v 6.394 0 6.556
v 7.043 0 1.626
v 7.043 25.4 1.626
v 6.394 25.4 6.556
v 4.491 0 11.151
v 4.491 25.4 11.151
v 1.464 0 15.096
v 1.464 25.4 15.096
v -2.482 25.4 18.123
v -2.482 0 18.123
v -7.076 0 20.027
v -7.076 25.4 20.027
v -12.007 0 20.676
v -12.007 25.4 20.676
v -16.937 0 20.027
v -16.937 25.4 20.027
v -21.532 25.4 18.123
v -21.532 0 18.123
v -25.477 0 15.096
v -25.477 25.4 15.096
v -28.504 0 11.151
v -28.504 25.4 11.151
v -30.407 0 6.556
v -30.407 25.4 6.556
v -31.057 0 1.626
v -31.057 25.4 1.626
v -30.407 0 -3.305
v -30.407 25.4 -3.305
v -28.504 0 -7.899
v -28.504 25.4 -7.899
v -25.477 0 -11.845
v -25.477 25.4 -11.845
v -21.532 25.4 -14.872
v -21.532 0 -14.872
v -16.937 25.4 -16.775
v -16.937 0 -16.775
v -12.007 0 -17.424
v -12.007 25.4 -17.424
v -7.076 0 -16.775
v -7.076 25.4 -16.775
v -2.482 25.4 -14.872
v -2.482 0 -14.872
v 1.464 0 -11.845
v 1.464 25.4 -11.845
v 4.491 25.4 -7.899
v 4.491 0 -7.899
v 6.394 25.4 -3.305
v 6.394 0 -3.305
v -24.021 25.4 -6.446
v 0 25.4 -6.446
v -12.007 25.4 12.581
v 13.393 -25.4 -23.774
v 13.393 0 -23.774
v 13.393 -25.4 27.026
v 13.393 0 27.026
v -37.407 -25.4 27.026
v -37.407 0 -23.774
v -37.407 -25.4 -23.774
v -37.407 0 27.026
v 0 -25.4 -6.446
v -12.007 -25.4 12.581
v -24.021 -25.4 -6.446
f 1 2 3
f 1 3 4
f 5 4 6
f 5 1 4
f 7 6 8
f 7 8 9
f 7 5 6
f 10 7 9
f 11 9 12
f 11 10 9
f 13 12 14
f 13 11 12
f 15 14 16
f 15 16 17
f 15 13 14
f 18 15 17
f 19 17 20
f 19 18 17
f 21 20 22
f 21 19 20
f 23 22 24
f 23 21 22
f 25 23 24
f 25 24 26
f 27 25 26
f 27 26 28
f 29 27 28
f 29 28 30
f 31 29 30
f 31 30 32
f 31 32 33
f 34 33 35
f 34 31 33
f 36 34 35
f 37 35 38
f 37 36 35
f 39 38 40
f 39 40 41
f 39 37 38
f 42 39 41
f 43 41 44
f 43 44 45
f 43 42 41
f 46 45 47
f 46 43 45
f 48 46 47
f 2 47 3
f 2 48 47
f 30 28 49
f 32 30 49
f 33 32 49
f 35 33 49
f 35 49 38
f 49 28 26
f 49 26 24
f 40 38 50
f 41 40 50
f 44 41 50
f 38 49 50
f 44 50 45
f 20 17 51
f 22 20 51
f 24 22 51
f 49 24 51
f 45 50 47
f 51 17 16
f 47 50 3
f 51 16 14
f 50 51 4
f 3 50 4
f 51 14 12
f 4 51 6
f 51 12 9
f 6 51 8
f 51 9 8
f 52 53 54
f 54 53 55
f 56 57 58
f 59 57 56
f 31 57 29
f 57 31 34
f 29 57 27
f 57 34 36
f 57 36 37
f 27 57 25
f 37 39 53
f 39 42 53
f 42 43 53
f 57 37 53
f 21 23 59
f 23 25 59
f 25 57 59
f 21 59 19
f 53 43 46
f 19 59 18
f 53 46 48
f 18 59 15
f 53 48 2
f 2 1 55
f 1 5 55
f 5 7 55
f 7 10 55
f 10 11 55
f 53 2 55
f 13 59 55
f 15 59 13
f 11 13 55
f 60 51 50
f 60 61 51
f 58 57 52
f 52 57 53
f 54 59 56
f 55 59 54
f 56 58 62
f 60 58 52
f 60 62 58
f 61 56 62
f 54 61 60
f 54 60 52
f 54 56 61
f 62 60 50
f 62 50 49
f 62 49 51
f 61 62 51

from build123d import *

# Parameters (mm, degrees)
F0_W     = 50.8
F0_H     = 50.8
F0_R     = 19.05
F1_DEPTH = 25.4
F2_DEPTH = 25.4


with BuildPart() as f1:
    # F0 (on Front) → F1 (new body)
    with BuildSketch(Plane.XZ):
        with Locations((-12.006546, 1.62563)):
            Rectangle(F0_W, F0_H)
        with Locations((-12.006546, 1.62563)):
            Circle(F0_R, mode=Mode.SUBTRACT)
        with Locations((-12.006546, 1.62563)):
            Circle(F0_R)
        Polygon((0, -6.445928), (-24.020746, -6.445928), (-12.006546, 12.581361), align=None, mode=Mode.SUBTRACT)
    extrude(amount=F1_DEPTH)

    # F0 (on Front) → F2 (join)
    with BuildSketch(Plane.XZ):
        with Locations((-12.006546, 1.62563)):
            Circle(F0_R)
        Polygon((0, -6.445928), (-24.020746, -6.445928), (-12.006546, 12.581361), align=None, mode=Mode.SUBTRACT)
    extrude(amount=-F2_DEPTH)


solid = f1.part
